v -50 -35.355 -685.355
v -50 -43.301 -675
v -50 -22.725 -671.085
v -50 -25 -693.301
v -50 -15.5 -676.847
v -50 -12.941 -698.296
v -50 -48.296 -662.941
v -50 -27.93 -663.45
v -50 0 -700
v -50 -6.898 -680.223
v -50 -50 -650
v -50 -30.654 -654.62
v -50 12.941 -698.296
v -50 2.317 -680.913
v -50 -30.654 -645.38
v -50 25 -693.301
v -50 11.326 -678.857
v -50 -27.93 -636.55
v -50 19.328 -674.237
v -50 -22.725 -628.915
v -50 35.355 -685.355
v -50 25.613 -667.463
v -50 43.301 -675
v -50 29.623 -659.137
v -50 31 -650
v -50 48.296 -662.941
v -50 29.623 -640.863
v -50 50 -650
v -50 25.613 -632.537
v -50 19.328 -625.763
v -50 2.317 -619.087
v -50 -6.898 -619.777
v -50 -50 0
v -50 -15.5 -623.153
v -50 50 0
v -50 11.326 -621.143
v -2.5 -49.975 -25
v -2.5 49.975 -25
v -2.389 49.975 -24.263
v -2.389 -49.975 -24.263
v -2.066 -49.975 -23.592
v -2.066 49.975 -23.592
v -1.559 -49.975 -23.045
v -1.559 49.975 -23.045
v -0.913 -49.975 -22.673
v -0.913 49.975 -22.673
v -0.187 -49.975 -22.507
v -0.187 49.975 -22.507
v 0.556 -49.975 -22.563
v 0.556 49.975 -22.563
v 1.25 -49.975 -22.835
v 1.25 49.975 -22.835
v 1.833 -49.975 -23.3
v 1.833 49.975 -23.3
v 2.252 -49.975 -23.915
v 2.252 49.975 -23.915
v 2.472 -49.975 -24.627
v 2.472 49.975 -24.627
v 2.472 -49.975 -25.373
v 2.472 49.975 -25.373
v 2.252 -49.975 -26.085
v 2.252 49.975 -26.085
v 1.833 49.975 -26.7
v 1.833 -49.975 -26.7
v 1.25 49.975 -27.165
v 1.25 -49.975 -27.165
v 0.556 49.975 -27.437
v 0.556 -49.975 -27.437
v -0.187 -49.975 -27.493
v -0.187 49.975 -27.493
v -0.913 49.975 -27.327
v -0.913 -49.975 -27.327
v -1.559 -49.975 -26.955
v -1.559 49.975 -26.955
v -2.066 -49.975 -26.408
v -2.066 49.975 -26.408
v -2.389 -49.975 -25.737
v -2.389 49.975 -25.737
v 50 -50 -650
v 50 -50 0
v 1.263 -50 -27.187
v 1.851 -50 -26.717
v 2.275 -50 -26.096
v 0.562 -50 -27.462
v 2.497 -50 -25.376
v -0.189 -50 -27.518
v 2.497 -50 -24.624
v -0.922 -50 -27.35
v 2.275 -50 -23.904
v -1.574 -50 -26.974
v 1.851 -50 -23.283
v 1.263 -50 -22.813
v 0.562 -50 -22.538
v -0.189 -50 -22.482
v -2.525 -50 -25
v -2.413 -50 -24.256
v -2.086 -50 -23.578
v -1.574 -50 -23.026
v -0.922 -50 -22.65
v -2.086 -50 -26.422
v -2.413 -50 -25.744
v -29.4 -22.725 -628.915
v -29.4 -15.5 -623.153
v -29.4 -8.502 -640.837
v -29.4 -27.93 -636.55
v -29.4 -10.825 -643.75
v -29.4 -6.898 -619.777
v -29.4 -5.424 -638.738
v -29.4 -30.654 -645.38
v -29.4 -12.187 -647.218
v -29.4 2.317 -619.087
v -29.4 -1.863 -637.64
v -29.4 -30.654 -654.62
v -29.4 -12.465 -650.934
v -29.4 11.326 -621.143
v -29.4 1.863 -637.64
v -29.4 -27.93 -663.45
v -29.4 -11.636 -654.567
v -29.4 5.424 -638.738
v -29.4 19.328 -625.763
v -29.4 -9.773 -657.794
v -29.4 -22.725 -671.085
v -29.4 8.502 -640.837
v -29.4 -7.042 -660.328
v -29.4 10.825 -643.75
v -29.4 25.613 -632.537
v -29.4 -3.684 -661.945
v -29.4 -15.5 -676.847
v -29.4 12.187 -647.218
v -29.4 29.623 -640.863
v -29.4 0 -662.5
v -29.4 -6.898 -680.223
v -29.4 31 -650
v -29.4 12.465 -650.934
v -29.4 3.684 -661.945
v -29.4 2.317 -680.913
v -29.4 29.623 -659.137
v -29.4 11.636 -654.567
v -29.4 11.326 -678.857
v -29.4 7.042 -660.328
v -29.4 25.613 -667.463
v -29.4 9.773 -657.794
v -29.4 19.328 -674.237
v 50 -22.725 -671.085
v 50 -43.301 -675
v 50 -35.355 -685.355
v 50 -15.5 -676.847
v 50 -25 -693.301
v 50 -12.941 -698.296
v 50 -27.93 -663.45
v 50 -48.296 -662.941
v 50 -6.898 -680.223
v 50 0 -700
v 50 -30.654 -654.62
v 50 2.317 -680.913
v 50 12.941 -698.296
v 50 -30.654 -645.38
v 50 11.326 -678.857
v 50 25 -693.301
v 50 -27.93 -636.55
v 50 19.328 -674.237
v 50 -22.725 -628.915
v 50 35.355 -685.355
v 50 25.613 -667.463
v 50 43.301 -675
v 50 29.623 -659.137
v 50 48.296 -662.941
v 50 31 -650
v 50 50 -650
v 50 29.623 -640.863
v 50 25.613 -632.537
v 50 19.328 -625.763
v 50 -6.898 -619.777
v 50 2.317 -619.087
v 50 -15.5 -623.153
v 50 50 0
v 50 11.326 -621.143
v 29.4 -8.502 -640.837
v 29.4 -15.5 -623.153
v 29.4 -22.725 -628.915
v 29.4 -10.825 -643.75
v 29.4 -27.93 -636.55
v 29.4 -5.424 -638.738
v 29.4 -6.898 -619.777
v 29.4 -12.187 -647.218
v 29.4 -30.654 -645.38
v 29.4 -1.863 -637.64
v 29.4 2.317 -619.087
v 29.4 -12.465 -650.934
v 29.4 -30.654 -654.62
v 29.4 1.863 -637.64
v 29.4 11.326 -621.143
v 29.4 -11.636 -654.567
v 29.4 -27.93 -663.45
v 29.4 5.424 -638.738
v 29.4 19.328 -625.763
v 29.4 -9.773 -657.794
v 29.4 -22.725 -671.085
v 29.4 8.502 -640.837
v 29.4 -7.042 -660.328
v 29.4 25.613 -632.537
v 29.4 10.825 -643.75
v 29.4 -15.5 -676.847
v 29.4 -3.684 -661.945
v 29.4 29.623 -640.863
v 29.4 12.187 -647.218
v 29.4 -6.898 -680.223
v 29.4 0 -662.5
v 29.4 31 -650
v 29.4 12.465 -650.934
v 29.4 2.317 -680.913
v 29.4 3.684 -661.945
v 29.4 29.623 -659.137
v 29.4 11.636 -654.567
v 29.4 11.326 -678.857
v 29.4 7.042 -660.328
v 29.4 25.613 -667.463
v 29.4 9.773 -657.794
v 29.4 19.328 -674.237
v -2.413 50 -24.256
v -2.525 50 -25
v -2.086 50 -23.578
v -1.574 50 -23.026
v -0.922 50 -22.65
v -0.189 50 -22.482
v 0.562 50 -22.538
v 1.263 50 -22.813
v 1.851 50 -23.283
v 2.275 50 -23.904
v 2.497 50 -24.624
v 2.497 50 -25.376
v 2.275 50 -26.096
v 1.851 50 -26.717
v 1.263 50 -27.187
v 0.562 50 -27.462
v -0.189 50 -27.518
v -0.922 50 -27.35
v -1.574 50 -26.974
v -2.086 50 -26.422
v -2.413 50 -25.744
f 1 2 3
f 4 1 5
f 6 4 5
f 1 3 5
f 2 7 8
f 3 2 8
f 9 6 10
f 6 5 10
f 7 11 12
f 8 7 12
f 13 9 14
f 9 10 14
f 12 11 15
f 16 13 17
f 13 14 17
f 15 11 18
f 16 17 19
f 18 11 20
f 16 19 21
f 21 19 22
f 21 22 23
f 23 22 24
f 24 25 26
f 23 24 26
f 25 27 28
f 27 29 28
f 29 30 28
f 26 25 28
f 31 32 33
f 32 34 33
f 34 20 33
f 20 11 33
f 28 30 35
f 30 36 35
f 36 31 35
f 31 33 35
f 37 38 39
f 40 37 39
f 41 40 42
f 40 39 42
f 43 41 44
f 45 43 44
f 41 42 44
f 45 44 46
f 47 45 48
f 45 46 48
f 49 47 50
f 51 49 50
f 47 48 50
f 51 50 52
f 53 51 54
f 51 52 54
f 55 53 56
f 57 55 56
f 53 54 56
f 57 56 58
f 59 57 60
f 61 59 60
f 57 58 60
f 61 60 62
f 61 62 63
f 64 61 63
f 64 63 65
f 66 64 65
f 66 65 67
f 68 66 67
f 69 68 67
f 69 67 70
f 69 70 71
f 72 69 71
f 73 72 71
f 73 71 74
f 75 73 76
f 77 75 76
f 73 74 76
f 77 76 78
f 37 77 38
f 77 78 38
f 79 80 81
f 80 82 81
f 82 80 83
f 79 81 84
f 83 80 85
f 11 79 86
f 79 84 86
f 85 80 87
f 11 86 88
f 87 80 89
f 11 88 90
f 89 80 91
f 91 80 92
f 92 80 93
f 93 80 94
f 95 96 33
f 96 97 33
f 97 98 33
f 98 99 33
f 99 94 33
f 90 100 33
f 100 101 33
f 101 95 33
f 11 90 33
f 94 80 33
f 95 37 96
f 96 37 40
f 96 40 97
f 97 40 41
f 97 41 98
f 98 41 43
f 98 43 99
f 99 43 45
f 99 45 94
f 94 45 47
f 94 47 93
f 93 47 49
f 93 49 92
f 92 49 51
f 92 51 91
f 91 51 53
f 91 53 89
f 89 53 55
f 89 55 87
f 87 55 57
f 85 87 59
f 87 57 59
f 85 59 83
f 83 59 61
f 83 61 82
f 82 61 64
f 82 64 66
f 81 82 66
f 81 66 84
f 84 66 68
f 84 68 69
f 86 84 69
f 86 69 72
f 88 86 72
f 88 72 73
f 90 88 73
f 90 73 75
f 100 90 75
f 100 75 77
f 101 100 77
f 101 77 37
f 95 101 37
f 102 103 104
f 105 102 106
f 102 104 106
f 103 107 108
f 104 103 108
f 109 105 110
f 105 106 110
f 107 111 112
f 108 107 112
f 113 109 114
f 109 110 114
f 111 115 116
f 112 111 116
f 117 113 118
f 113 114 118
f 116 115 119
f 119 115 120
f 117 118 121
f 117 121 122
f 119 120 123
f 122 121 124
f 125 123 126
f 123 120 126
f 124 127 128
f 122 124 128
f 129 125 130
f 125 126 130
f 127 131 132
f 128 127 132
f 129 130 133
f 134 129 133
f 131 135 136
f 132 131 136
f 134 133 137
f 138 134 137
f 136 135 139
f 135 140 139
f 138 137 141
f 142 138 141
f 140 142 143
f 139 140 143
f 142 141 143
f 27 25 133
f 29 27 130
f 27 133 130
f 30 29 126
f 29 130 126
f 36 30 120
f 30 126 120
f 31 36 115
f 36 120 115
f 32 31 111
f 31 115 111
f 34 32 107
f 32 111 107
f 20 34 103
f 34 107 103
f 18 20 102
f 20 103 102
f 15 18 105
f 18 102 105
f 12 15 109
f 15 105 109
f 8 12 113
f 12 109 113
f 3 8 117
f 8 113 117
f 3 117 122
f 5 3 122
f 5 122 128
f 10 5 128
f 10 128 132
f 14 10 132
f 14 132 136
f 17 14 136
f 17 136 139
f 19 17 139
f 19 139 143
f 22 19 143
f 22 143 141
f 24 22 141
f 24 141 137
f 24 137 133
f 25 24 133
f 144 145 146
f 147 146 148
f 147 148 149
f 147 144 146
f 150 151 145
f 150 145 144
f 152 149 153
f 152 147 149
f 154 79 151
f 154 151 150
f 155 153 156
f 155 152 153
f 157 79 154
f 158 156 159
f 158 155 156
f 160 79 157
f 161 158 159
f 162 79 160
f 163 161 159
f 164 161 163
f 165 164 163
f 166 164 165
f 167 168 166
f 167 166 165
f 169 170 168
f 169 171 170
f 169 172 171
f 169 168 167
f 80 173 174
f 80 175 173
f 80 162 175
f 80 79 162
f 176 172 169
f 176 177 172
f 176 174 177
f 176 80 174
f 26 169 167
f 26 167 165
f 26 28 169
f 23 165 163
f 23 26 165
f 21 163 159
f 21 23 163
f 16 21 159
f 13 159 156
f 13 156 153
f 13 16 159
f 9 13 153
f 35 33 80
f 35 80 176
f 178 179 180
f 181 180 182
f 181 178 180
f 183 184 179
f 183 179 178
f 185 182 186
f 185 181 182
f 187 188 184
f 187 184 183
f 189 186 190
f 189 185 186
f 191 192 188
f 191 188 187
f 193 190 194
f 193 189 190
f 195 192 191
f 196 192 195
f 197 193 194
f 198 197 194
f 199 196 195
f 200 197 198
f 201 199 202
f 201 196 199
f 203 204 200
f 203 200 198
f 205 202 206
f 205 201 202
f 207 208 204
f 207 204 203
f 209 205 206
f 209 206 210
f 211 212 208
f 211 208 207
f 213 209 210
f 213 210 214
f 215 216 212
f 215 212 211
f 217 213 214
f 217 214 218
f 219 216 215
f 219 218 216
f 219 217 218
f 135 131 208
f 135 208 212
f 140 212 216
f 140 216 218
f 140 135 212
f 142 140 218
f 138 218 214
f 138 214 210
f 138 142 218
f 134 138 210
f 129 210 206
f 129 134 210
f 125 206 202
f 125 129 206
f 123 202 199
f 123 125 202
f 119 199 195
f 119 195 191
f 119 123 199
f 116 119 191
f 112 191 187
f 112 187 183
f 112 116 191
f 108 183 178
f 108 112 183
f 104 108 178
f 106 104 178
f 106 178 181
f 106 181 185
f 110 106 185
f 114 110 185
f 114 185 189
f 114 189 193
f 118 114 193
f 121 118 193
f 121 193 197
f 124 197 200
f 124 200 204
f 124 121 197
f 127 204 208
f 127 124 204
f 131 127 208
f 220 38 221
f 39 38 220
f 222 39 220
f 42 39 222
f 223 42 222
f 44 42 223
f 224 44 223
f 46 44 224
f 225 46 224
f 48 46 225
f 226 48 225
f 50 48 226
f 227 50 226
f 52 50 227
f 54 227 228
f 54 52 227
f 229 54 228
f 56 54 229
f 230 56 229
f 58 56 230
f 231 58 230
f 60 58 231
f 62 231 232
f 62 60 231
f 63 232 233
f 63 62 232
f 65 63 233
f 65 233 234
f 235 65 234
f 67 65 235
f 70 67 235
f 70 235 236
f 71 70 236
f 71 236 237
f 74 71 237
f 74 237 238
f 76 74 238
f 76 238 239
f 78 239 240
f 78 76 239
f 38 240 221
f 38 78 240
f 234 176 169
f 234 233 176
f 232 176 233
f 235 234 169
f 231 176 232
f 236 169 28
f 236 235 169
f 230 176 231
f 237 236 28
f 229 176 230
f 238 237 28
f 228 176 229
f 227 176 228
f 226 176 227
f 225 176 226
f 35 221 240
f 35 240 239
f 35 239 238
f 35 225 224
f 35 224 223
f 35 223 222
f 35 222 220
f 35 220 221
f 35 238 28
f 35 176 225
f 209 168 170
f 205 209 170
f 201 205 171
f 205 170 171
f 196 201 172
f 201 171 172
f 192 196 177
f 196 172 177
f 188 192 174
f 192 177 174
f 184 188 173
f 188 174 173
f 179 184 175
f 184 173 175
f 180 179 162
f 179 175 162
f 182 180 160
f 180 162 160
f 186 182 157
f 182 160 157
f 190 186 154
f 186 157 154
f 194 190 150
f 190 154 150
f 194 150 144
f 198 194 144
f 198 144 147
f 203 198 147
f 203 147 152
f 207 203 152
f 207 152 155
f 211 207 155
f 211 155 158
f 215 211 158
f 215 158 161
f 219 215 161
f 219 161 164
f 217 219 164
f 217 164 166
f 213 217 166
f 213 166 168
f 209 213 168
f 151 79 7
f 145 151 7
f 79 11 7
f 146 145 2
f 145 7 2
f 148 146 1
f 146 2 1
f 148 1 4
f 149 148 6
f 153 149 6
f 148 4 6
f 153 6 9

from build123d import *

# Parameters (mm, degrees)
SKETCH1_W                       = 100
SKETCH1_H                       = 100
BOSS_EXTRUDE1_DEPTH             = 700
FILLET1_R                       = 50
SKETCH2_R                       = 31
CUT_EXTRUDE1_DEPTH              = 100
F_5_0MM_DOWEL_HOLE1_D           = 5
F_5_0MM_DOWEL_HOLE1_CSINK_D     = 5.05
F_5_0MM_DOWEL_HOLE1_CSINK_ANGLE = 90
BOSS_EXTRUDE2_DEPTH             = 29.4
BOSS_EXTRUDE2_DEPTH_BACK        = 29.4
SKETCH6_R                       = 31
SKETCH6_R_2                     = 12.5


with BuildPart() as part:
    # Sketch1 → Boss-Extrude1 (new body)
    with BuildSketch(Plane(origin=(0, 0, 0), x_dir=(0, 1, 0), z_dir=(0, 0, 1))):
        Rectangle(SKETCH1_W, SKETCH1_H)
    extrude(amount=-BOSS_EXTRUDE1_DEPTH)

    # Fillet1
    fillet1_edges = [part.edges().sort_by_distance(p)[0] for p in [
        (0, -50, -700),
        (0, 50, -700),
    ]]
    fillet(fillet1_edges, radius=FILLET1_R - 0.0001)  # a hair under: the kernel refuses the full size

    # Sketch2 → Cut-Extrude1 (cut)
    with BuildSketch(Plane.YZ.offset(50)):
        with Locations((0, -650)):
            Circle(SKETCH2_R)
    extrude(amount=-CUT_EXTRUDE1_DEPTH, mode=Mode.SUBTRACT)

    # Ø5.0mm Dowel Hole1 (through all)
    with Locations(Plane.XZ.offset(50)):
        with Locations((0, -25)):
            f_5_0mm_dowel_hole1 = CounterSinkHole(F_5_0MM_DOWEL_HOLE1_D / 2, F_5_0MM_DOWEL_HOLE1_CSINK_D / 2, counter_sink_angle=F_5_0MM_DOWEL_HOLE1_CSINK_ANGLE)

    # Mirror1: Ø5.0mm Dowel Hole1 across plane
    add(f_5_0mm_dowel_hole1.mirror(Plane.ZX), mode=Mode.SUBTRACT)

    # Sketch6 → Boss-Extrude2 (add, two sides: drawn at the far end of the back side and taken through both)
    with BuildSketch(Plane.YZ.offset(-BOSS_EXTRUDE2_DEPTH_BACK)):
        with Locations(Location((0, -650, 0), (0, 0, 270))):
            Circle(SKETCH6_R)
        with Locations(Location((0, -650, 0), (0, 0, 270))):
            Circle(SKETCH6_R_2, mode=Mode.SUBTRACT)
    extrude(amount=BOSS_EXTRUDE2_DEPTH + BOSS_EXTRUDE2_DEPTH_BACK)


solid = part.part
